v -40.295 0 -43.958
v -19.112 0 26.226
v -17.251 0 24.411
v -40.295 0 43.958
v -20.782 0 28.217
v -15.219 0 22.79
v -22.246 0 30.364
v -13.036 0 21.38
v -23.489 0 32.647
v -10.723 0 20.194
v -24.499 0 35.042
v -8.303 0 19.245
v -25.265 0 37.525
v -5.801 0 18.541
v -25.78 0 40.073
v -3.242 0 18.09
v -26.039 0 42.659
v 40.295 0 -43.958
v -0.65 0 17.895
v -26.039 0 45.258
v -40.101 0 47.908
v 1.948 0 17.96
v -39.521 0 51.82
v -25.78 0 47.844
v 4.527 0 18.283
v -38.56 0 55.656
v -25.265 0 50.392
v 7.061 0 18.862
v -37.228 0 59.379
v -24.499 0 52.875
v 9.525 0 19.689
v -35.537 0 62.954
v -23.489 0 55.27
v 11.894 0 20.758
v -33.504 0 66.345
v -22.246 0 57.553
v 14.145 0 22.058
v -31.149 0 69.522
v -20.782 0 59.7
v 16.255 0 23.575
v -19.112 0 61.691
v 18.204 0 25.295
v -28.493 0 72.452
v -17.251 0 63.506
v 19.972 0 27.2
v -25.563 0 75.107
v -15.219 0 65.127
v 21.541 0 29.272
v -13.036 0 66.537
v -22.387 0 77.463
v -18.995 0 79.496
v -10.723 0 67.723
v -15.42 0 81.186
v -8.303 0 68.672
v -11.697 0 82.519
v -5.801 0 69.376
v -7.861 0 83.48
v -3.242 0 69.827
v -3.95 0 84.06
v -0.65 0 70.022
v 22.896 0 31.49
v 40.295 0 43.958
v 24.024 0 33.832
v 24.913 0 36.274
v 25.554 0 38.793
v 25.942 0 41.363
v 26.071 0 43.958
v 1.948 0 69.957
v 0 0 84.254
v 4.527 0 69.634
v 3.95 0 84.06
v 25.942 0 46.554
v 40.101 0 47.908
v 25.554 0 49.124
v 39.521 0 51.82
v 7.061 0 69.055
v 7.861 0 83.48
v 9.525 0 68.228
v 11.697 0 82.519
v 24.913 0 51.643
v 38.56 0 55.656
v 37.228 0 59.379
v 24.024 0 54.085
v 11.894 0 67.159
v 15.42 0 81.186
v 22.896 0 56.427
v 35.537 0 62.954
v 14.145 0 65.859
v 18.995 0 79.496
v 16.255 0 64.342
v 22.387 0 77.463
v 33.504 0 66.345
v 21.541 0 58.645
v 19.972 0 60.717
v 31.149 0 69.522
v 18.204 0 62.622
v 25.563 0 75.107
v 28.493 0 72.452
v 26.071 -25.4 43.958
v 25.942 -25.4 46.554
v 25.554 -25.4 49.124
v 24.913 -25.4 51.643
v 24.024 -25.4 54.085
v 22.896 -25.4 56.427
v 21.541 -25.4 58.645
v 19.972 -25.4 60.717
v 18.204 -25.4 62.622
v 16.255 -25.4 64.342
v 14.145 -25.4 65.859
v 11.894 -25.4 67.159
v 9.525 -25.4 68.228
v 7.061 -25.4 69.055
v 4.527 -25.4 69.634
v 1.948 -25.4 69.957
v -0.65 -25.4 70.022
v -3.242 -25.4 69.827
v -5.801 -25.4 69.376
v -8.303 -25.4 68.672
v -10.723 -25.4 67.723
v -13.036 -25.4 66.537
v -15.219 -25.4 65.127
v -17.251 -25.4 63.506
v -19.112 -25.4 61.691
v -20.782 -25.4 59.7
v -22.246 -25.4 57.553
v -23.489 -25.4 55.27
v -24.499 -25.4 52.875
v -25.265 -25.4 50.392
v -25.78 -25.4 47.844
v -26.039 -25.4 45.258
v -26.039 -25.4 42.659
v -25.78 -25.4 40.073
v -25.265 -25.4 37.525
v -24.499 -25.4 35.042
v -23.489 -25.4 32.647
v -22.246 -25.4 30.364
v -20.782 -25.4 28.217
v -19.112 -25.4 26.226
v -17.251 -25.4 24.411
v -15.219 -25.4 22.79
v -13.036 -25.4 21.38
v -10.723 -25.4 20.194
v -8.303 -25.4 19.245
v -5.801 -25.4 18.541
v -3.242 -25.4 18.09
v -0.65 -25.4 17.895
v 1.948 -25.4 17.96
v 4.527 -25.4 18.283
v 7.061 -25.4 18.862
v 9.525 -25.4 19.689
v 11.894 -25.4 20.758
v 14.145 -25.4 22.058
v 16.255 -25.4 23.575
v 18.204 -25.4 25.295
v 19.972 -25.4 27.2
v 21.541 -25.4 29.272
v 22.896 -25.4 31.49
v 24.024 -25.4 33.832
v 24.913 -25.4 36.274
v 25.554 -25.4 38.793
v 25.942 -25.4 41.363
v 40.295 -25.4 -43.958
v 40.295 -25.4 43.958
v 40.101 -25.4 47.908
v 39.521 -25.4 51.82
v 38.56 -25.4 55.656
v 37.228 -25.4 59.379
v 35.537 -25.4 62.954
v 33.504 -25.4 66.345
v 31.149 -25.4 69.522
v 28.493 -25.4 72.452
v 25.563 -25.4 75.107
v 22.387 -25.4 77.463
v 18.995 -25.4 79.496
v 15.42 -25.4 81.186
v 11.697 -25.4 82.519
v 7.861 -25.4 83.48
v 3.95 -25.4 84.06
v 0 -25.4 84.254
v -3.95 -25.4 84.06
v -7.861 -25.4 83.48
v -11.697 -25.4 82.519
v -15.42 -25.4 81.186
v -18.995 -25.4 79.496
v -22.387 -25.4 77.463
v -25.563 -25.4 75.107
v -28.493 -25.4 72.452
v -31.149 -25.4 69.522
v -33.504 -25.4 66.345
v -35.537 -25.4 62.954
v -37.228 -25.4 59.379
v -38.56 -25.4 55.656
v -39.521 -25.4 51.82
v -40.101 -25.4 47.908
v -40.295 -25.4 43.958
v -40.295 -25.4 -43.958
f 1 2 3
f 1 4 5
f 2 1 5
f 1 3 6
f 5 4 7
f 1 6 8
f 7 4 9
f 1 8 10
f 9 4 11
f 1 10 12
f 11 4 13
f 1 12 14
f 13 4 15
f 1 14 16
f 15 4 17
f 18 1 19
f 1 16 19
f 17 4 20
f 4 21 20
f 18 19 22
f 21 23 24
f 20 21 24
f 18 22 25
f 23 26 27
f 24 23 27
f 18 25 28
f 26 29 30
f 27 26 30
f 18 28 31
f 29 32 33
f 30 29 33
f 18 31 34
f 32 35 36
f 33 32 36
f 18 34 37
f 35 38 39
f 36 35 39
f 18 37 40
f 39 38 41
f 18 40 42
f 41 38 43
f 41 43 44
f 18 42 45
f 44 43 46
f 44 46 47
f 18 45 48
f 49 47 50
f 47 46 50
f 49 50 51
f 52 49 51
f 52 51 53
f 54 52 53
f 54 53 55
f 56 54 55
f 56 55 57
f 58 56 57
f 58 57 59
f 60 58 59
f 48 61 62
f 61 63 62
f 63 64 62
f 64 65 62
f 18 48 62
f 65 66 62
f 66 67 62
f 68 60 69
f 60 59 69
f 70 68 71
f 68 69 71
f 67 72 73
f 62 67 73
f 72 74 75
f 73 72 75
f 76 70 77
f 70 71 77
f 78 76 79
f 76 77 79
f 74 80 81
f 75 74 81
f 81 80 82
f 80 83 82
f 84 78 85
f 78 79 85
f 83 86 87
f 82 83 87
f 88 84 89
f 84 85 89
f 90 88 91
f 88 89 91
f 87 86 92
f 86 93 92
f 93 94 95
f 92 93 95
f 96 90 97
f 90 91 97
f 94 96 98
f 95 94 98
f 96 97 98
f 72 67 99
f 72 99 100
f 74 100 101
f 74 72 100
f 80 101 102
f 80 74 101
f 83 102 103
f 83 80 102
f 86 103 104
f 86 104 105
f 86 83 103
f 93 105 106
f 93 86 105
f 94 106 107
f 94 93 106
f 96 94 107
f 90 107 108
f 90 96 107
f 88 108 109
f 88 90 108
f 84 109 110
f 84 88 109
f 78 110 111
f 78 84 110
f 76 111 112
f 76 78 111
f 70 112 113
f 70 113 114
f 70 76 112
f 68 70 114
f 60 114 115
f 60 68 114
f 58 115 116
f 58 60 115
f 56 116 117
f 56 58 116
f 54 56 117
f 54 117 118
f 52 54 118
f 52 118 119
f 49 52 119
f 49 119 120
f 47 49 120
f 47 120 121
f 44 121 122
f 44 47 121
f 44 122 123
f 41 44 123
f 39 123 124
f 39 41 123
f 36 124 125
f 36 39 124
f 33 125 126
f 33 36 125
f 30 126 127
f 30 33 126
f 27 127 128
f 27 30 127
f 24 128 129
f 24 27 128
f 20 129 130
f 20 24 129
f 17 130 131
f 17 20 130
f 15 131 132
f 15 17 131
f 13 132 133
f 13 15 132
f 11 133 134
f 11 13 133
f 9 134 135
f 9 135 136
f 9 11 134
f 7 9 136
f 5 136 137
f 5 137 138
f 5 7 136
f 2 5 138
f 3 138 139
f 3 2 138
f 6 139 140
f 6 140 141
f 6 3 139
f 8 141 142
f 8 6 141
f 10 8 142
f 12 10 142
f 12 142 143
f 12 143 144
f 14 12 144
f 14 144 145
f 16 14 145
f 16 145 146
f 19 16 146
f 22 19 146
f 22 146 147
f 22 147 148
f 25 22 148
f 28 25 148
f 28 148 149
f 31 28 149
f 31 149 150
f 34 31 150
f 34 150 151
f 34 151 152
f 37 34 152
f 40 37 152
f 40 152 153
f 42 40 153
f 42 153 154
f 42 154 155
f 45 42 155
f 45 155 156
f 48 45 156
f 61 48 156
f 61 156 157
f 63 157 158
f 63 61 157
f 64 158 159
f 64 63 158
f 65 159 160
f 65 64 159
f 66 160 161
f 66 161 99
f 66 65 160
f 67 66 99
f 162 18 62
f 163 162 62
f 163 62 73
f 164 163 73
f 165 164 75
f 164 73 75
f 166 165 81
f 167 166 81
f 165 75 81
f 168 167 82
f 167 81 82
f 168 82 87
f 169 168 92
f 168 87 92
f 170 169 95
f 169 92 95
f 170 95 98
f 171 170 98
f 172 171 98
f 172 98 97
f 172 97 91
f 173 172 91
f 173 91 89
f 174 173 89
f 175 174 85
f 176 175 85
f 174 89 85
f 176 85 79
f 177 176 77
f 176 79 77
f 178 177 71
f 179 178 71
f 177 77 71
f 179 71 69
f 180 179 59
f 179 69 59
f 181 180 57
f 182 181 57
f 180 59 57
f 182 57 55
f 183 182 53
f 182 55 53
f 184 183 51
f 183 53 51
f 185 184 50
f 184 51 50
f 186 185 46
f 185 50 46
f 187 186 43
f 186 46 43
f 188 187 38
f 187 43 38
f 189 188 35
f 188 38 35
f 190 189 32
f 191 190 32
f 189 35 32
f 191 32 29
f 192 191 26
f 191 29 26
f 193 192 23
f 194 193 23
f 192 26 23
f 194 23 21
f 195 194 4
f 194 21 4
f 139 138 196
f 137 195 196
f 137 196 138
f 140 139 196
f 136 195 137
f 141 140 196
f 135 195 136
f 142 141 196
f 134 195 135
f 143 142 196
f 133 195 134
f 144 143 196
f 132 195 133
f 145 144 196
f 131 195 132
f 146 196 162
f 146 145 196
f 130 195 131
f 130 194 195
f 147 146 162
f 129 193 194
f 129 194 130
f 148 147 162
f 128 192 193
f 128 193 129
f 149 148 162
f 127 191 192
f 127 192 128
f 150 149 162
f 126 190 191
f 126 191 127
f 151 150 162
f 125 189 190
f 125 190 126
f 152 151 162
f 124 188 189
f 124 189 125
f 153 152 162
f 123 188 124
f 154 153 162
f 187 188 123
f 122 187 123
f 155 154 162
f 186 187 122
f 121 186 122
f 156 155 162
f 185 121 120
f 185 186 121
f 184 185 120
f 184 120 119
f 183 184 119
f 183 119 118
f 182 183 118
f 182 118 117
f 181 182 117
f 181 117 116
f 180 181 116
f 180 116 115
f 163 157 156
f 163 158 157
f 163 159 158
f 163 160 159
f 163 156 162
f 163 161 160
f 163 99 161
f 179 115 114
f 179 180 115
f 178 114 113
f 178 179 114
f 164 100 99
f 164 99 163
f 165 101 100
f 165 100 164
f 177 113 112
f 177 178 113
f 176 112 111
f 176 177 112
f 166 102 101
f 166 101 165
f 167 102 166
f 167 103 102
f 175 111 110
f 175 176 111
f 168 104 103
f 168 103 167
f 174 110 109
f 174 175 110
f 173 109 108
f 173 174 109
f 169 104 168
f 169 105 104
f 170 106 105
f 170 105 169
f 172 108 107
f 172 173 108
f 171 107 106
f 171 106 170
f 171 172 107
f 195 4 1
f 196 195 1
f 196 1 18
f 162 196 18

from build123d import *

# Parameters (mm, degrees)
F0_R     = 26.071284
F1_DEPTH = 25.4


with BuildPart() as f1:
    # F0 (on Front) → F1 (new body)
    with BuildSketch(Plane.XZ):
        with BuildLine():
            Line((-40.295284, 43.9585), (-40.295284, -43.9585))
            Line((-40.295284, -43.9585), (40.295284, -43.9585))
            Line((40.295284, -43.9585), (40.295284, 43.9585))
            ThreePointArc((40.295284, 43.9585), (0, 3.663216), (-40.295284, 43.9585))
        make_face()
        with BuildLine():
            ThreePointArc((40.295284, 43.9585), (0, 84.253784), (-40.295284, 43.9585))
            ThreePointArc((-40.295284, 43.9585), (0, 3.663216), (40.295284, 43.9585))
        make_face()
        with Locations((0, 43.9585)):
            Circle(F0_R, mode=Mode.SUBTRACT)
    extrude(amount=F1_DEPTH)


solid = f1.part
